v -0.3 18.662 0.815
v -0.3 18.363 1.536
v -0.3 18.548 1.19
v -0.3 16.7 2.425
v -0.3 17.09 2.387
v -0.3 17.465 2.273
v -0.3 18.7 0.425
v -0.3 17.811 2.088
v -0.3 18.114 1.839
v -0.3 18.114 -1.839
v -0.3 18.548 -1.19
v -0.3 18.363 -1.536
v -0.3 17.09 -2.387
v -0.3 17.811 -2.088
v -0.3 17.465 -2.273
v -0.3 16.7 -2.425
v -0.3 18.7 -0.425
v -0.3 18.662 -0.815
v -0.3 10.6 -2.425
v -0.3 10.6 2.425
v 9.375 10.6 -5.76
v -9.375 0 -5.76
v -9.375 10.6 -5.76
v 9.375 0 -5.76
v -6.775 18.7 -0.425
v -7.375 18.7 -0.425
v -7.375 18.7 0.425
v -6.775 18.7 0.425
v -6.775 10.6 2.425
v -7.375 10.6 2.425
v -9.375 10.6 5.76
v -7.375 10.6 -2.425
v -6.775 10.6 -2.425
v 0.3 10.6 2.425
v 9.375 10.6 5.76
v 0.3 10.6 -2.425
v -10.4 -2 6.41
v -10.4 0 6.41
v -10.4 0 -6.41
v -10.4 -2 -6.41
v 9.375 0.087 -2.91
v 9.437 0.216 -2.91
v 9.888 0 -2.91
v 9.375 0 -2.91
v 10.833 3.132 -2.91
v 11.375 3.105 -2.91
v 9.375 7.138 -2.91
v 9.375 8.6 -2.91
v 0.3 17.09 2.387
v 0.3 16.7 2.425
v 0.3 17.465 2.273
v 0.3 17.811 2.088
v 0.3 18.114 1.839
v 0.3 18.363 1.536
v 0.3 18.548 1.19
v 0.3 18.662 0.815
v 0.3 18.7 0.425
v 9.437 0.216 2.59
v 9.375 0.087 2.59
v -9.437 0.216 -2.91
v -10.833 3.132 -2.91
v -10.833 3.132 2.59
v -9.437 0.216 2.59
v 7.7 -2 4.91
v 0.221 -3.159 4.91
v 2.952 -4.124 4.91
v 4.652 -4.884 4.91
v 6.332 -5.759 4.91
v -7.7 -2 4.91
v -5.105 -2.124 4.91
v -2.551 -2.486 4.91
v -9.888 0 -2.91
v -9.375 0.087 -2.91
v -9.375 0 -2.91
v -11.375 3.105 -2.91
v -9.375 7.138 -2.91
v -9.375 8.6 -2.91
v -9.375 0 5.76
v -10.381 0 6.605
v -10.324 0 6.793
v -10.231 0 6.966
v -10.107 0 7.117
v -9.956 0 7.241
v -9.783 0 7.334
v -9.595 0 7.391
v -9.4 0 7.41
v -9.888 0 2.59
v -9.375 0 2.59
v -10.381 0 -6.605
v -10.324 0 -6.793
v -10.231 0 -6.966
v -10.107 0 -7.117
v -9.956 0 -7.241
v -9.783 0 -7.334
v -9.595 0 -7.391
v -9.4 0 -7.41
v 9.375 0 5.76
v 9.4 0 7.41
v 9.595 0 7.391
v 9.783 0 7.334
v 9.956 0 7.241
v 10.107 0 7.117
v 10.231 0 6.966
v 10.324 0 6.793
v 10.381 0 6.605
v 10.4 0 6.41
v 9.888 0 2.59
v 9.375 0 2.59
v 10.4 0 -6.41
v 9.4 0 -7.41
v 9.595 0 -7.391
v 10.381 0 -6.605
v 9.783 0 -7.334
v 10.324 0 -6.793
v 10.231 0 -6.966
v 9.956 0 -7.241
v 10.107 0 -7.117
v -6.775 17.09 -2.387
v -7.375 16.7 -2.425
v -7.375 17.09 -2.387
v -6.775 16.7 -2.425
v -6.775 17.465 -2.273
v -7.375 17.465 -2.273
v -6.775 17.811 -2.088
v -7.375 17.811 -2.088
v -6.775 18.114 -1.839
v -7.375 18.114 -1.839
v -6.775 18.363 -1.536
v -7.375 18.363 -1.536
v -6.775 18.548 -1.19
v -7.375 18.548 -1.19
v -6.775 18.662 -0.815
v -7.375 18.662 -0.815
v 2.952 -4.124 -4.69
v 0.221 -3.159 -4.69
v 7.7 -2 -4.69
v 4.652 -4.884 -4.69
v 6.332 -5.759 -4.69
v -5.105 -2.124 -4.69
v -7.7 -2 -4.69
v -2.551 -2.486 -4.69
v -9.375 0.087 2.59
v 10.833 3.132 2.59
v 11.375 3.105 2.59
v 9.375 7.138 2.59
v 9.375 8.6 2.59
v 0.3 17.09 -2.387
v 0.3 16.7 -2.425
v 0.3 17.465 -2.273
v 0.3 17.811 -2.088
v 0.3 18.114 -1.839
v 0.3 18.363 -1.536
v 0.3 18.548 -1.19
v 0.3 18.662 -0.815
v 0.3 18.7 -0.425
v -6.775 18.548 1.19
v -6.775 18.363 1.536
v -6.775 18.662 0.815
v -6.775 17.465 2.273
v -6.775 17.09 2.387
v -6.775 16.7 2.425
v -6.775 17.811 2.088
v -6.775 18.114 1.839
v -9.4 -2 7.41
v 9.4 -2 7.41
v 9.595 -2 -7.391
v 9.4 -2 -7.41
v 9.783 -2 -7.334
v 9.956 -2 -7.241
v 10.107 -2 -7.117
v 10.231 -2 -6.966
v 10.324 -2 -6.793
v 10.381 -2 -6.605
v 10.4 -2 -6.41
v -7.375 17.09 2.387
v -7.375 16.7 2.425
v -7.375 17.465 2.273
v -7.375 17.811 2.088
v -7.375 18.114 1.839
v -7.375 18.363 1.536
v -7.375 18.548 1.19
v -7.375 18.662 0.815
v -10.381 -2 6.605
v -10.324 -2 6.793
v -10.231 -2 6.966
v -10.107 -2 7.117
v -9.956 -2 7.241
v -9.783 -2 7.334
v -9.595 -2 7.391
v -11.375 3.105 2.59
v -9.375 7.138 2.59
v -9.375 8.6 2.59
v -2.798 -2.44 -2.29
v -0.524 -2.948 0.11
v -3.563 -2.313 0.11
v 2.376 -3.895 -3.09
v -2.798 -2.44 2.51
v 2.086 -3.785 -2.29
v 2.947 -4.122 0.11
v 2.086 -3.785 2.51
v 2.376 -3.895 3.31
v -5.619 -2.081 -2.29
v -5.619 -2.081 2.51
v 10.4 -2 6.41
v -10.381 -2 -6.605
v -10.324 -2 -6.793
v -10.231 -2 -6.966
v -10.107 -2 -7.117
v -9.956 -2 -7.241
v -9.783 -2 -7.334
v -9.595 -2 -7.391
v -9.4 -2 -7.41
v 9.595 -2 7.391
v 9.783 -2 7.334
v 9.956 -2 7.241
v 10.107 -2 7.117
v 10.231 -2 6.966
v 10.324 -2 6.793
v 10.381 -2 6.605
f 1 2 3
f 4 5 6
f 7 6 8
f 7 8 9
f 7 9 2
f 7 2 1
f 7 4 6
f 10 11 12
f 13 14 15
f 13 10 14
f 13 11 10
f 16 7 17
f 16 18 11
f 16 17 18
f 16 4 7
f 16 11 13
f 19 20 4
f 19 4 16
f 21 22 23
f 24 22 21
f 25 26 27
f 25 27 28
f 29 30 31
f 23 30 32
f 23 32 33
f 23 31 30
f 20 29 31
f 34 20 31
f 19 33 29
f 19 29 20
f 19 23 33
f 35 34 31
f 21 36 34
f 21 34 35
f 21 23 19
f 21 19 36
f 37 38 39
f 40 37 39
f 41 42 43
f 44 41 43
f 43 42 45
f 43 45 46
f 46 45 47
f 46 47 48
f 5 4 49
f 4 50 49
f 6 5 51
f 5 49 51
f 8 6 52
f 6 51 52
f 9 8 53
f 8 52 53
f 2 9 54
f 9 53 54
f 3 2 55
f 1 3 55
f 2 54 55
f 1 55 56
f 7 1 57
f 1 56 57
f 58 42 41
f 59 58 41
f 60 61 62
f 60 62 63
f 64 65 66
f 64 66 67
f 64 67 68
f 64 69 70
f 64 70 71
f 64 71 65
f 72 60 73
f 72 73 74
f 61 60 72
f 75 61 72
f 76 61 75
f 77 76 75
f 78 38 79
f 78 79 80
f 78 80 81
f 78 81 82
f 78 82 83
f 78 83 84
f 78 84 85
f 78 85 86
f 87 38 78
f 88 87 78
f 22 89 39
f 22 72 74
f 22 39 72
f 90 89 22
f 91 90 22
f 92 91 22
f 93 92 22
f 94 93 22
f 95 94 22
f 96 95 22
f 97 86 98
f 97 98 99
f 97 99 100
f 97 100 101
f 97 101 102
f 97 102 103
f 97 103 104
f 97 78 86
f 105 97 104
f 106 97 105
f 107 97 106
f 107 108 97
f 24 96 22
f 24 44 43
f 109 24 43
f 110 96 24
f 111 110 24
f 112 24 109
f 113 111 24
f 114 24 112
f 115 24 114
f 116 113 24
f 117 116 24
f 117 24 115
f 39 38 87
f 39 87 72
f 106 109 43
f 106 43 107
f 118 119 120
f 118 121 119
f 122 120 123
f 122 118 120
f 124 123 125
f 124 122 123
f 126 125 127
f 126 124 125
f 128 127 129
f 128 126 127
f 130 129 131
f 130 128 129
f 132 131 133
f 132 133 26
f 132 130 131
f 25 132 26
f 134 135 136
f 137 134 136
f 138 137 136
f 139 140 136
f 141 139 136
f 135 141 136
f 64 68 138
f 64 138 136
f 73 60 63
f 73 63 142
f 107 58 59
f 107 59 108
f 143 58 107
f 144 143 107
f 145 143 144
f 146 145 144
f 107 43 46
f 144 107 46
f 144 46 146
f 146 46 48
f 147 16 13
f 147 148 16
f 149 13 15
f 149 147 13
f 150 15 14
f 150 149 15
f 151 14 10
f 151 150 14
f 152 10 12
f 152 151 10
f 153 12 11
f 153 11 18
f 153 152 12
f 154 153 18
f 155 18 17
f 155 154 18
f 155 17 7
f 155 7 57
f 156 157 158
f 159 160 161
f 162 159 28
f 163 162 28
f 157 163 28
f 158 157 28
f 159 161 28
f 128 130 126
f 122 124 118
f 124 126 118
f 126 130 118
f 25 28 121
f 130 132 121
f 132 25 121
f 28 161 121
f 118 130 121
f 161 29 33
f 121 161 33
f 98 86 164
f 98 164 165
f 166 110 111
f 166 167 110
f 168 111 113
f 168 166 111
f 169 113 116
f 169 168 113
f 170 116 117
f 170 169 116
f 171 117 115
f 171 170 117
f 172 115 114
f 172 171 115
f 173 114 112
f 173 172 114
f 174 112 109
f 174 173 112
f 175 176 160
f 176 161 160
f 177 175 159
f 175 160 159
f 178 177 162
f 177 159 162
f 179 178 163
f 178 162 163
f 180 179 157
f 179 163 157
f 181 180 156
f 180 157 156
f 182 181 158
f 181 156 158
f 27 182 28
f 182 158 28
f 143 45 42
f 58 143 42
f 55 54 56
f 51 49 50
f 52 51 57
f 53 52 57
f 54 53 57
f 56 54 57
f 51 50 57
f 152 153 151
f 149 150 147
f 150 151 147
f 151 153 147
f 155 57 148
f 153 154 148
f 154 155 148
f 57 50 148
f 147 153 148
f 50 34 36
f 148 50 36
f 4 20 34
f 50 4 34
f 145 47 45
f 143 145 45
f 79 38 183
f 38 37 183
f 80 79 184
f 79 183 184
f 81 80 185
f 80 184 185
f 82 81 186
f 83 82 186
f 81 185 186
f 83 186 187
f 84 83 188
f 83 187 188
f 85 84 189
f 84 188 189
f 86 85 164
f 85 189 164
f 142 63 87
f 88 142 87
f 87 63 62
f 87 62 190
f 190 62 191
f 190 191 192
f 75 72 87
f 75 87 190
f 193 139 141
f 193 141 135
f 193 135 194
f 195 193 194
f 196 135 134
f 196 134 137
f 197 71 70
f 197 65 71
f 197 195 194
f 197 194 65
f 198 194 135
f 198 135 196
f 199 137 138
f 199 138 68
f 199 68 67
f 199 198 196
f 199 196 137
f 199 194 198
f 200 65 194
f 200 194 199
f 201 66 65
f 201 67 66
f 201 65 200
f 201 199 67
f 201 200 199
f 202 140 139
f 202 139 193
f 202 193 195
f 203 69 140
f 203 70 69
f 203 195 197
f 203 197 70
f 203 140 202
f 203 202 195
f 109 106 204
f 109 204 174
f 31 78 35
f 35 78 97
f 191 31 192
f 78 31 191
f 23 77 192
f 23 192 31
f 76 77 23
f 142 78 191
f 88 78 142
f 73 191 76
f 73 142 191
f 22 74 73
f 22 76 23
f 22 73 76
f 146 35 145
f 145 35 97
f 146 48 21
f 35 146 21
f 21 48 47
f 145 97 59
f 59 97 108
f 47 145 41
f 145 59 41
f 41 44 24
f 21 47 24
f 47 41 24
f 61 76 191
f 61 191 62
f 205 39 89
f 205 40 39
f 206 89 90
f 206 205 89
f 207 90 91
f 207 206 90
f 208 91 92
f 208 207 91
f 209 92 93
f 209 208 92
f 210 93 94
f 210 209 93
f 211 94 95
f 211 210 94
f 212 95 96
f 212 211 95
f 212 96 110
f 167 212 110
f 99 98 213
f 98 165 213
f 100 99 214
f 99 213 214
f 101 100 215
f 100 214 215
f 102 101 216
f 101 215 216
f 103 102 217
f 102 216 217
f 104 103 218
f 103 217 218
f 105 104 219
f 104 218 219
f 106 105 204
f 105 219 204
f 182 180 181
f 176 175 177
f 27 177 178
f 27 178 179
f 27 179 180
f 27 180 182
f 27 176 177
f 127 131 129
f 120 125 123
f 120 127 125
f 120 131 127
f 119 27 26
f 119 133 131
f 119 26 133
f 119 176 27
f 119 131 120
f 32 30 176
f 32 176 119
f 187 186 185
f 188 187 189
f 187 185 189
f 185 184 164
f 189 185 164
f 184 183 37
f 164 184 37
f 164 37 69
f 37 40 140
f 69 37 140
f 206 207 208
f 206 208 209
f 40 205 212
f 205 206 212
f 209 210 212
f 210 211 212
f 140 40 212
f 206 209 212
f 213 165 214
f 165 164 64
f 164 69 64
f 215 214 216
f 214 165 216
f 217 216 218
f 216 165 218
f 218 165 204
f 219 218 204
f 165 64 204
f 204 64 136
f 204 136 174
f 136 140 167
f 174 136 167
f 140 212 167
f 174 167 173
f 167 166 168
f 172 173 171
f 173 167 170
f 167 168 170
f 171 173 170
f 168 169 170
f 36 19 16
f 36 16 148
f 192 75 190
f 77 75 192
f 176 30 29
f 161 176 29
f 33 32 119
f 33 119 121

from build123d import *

# Parameters (mm, degrees)
SKETCH1_W           = 18.75
SKETCH1_H           = 11.52
BOSS_EXTRUDE1_DEPTH = 10.6
SKETCH2_W           = 20.8
SKETCH2_H           = 14.82
BOSS_EXTRUDE2_DEPTH = 2
BOSS_EXTRUDE3_START = -2.5
BOSS_EXTRUDE3_DEPTH = 9.6
SKETCH5_W           = 0.6
SKETCH5_H           = 4.85
BOSS_EXTRUDE4_DEPTH = 8.1
BOSS_EXTRUDE5_START = -2.85
BOSS_EXTRUDE5_DEPTH = 5.5
FILLET1_R           = 2
FILLET2_R           = 1


with BuildPart() as part:
    # Sketch1 → Boss-Extrude1 (new body)
    with BuildSketch(Plane(origin=(0, 0, 0), x_dir=(1, 0, 0), z_dir=(0, 1, 0))):
        Rectangle(SKETCH1_W, SKETCH1_H)
    extrude(amount=BOSS_EXTRUDE1_DEPTH)

    # Sketch2 → Boss-Extrude2 (add)
    with BuildSketch(Plane(origin=(0, 0, 0), x_dir=(1, 0, 0), z_dir=(0, 1, 0))):
        Rectangle(SKETCH2_W, SKETCH2_H)
    extrude(amount=-BOSS_EXTRUDE2_DEPTH)

    # Sketch4 → Boss-Extrude3 (add)
    with BuildSketch(Plane.XY.offset(7.41).offset(BOSS_EXTRUDE3_START)):
        with BuildLine():
            Line((7.7, -2), (-7.7, -2))
            add(Edge.make_bspline(
                [(-7.7, -2), (-0.364289246, -2.017203107), (6.331919427, -5.758770483)],
                knots=[0, 0, 0, 1, 1, 1], degree=2))
            Line((6.331919427, -5.758770483), (7.7, -2))
        make_face()
    extrude(amount=-BOSS_EXTRUDE3_DEPTH)

    # Sketch5 → Boss-Extrude4 (add)
    with BuildSketch(Plane(origin=(0, 10.6, 0), x_dir=(1, 0, 0), z_dir=(0, 1, 0))):
        with Locations((-7.075, 0)):
            Rectangle(SKETCH5_W, SKETCH5_H)
        Rectangle(SKETCH5_W, SKETCH5_H)
    extrude(amount=BOSS_EXTRUDE4_DEPTH)

    # Sketch6 → Boss-Extrude5 (add)
    with BuildSketch(Plane(origin=(0, 0, -5.76), x_dir=(-1, 0, 0), z_dir=(0, 0, -1)).offset(BOSS_EXTRUDE5_START)):
        Polygon((11.375, 3.105045161), (9.375, 8.6), (9.375, 7.1380978), (10.833272639, 3.131526652), (9.436573077, 0.216020625), (9.375, 0.087491424), (9.375, 0), (9.8875, 0), align=None)
    boss_extrude5 = extrude(amount=-BOSS_EXTRUDE5_DEPTH)

    # Mirror1: Boss-Extrude5 across plane
    add(boss_extrude5.mirror(Plane(origin=(0, 0, 0), x_dir=(0, 0, 1), z_dir=(1, 0, 0))))

    # Fillet1
    fillet1_edges = [part.edges().sort_by_distance(p)[0] for p in [
        (-7.075, 18.7, -2.425),
        (-7.075, 18.7, 2.425),
        (0, 18.7, -2.425),
        (0, 18.7, 2.425),
    ]]
    fillet(fillet1_edges, radius=FILLET1_R)

    # Fillet2
    fillet2_edges = [part.edges().sort_by_distance(p)[0] for p in [
        (10.4, -1, -7.41),
        (10.4, -1, 7.41),
        (-10.4, -1, 7.41),
        (-10.4, -1, -7.41),
    ]]
    fillet(fillet2_edges, radius=FILLET2_R)


solid = part.part
